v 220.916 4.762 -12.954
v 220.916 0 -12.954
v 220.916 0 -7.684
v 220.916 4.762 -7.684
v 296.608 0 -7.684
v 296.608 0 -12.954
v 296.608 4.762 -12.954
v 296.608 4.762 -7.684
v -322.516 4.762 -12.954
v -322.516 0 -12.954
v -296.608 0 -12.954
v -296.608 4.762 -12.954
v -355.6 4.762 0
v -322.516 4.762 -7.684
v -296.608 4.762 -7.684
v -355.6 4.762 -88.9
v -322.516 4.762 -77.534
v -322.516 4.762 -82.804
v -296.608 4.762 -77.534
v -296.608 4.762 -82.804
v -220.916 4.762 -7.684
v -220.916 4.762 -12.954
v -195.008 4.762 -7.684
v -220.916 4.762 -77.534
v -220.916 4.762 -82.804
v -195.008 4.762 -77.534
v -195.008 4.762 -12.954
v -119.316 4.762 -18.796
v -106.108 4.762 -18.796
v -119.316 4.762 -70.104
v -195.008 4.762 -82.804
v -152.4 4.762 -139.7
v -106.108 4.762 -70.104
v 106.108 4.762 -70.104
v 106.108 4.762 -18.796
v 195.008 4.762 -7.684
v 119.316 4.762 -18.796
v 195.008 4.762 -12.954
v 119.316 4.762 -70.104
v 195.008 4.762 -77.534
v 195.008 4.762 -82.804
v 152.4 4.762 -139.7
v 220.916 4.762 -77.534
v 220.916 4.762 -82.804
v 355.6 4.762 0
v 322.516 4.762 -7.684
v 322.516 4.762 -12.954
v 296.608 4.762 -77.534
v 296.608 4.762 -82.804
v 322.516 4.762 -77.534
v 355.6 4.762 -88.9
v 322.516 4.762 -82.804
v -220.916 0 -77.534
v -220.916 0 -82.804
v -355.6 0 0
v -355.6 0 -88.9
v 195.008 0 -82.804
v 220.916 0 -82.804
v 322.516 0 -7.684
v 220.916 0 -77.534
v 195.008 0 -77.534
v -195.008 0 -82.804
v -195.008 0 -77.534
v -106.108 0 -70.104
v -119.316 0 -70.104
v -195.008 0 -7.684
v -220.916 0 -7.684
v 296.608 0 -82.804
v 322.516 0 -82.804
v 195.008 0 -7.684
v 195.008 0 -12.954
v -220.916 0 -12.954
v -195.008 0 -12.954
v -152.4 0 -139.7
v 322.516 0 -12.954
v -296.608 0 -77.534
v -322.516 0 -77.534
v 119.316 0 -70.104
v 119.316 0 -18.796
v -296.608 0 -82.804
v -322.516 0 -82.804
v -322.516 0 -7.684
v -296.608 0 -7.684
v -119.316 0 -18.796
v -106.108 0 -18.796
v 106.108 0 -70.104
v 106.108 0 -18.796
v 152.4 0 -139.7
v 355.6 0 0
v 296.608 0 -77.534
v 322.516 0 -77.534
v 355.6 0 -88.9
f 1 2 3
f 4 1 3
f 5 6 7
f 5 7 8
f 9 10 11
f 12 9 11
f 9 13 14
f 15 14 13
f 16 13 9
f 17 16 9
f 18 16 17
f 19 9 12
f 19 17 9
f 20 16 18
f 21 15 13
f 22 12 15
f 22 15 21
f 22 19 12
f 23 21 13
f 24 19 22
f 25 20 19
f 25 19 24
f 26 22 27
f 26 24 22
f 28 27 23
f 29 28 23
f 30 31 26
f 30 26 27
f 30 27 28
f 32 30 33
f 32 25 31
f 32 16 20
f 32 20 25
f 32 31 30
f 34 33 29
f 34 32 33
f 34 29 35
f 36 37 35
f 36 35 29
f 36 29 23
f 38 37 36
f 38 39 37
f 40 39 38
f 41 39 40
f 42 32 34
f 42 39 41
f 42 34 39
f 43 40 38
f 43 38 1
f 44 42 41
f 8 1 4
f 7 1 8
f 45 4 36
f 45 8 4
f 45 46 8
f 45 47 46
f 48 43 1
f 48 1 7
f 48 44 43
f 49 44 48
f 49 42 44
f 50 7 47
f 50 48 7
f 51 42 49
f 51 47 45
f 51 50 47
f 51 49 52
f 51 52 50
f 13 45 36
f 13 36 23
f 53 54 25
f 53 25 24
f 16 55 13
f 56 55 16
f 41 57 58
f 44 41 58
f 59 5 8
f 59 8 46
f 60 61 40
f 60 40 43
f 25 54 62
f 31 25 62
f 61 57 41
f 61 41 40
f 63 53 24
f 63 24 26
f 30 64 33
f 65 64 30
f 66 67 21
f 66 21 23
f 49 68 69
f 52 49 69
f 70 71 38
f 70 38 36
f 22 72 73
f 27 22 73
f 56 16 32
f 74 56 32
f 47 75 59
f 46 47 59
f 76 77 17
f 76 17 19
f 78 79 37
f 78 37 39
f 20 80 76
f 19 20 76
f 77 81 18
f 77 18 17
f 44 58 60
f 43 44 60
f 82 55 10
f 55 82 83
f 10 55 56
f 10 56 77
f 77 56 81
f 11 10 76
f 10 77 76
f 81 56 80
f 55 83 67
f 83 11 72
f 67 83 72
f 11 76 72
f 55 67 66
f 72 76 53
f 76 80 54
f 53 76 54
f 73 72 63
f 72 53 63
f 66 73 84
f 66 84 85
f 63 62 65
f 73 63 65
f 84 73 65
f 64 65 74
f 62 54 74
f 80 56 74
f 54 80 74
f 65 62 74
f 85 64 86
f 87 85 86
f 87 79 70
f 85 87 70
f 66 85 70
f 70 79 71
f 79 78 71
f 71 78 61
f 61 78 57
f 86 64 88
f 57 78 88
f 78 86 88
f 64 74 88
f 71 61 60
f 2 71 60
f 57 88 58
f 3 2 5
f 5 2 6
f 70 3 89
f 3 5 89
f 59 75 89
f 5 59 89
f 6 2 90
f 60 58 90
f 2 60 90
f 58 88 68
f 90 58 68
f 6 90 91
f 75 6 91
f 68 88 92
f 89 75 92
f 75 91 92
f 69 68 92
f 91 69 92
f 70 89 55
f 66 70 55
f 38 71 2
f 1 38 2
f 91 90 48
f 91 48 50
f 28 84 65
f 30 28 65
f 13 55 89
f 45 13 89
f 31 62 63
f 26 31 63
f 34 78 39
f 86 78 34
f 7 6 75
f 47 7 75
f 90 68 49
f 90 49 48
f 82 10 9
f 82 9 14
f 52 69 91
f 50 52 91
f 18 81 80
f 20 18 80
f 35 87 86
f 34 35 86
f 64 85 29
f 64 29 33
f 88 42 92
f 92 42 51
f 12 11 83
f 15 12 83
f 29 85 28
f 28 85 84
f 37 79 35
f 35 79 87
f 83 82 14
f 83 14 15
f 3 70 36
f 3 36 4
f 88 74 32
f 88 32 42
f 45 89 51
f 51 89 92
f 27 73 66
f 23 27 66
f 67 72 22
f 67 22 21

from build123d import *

# Parameters (mm, degrees)
SKETCH1_W           = 711.2
SKETCH1_H           = 139.7
BOSS_EXTRUDE1_DEPTH = 4.7625
CUT_EXTRUDE1_DEPTH  = 5.7625
SKETCH3_W           = 13.208
SKETCH3_H           = 51.308
CUT_EXTRUDE2_DEPTH  = 5.7625
SKETCH4_W           = 25.908
SKETCH4_H           = 5.2705
CUT_EXTRUDE3_DEPTH  = 5.7625


with BuildPart() as part:
    # Sketch1 → Boss-Extrude1 (new body)
    with BuildSketch(Plane(origin=(0, 0, 0), x_dir=(1, 0, 0), z_dir=(0, 1, 0))):
        with Locations((0, 69.85)):
            Rectangle(SKETCH1_W, SKETCH1_H)
    extrude(amount=BOSS_EXTRUDE1_DEPTH)

    # Sketch2 → Cut-Extrude1 (cut, through all)
    with BuildSketch(Plane(origin=(0, 4.7625, 0), x_dir=(1, 0, 0), z_dir=(0, 1, 0))):
        Polygon((-355.6, 88.9), (-152.4, 139.7), (-355.6, 139.7), align=None)
        Polygon((355.6, 139.7), (152.4, 139.7), (355.6, 88.9), align=None)
    extrude(amount=-CUT_EXTRUDE1_DEPTH, mode=Mode.SUBTRACT)

    # Sketch3 → Cut-Extrude2 (cut, through all)
    with BuildSketch(Plane(origin=(0, 0, 0), x_dir=(-1, 0, 0), z_dir=(0, -1, 0))):
        with Locations((-112.7125, 44.45)):
            Rectangle(SKETCH3_W, SKETCH3_H)
        with Locations((112.7125, 44.45)):
            Rectangle(SKETCH3_W, SKETCH3_H)
    extrude(amount=-CUT_EXTRUDE2_DEPTH, mode=Mode.SUBTRACT)

    # Sketch4 → Cut-Extrude3 (cut, through all)
    with BuildSketch(Plane.XZ):
        with Locations((-207.9625, -10.31875)):
            Rectangle(SKETCH4_W, SKETCH4_H)
        with Locations((-207.9625, -80.16875)):
            Rectangle(SKETCH4_W, SKETCH4_H)
        with Locations((-309.5625, -80.16875)):
            Rectangle(SKETCH4_W, SKETCH4_H)
        with Locations((-309.5625, -10.31875)):
            Rectangle(SKETCH4_W, SKETCH4_H)
        with Locations((207.9625, -80.16875)):
            Rectangle(SKETCH4_W, SKETCH4_H)
        with Locations((309.5625, -80.16875)):
            Rectangle(SKETCH4_W, SKETCH4_H)
        with Locations((309.5625, -10.31875)):
            Rectangle(SKETCH4_W, SKETCH4_H)
        with Locations((207.9625, -10.31875)):
            Rectangle(SKETCH4_W, SKETCH4_H)
    extrude(amount=-CUT_EXTRUDE3_DEPTH, mode=Mode.SUBTRACT)


solid = part.part
